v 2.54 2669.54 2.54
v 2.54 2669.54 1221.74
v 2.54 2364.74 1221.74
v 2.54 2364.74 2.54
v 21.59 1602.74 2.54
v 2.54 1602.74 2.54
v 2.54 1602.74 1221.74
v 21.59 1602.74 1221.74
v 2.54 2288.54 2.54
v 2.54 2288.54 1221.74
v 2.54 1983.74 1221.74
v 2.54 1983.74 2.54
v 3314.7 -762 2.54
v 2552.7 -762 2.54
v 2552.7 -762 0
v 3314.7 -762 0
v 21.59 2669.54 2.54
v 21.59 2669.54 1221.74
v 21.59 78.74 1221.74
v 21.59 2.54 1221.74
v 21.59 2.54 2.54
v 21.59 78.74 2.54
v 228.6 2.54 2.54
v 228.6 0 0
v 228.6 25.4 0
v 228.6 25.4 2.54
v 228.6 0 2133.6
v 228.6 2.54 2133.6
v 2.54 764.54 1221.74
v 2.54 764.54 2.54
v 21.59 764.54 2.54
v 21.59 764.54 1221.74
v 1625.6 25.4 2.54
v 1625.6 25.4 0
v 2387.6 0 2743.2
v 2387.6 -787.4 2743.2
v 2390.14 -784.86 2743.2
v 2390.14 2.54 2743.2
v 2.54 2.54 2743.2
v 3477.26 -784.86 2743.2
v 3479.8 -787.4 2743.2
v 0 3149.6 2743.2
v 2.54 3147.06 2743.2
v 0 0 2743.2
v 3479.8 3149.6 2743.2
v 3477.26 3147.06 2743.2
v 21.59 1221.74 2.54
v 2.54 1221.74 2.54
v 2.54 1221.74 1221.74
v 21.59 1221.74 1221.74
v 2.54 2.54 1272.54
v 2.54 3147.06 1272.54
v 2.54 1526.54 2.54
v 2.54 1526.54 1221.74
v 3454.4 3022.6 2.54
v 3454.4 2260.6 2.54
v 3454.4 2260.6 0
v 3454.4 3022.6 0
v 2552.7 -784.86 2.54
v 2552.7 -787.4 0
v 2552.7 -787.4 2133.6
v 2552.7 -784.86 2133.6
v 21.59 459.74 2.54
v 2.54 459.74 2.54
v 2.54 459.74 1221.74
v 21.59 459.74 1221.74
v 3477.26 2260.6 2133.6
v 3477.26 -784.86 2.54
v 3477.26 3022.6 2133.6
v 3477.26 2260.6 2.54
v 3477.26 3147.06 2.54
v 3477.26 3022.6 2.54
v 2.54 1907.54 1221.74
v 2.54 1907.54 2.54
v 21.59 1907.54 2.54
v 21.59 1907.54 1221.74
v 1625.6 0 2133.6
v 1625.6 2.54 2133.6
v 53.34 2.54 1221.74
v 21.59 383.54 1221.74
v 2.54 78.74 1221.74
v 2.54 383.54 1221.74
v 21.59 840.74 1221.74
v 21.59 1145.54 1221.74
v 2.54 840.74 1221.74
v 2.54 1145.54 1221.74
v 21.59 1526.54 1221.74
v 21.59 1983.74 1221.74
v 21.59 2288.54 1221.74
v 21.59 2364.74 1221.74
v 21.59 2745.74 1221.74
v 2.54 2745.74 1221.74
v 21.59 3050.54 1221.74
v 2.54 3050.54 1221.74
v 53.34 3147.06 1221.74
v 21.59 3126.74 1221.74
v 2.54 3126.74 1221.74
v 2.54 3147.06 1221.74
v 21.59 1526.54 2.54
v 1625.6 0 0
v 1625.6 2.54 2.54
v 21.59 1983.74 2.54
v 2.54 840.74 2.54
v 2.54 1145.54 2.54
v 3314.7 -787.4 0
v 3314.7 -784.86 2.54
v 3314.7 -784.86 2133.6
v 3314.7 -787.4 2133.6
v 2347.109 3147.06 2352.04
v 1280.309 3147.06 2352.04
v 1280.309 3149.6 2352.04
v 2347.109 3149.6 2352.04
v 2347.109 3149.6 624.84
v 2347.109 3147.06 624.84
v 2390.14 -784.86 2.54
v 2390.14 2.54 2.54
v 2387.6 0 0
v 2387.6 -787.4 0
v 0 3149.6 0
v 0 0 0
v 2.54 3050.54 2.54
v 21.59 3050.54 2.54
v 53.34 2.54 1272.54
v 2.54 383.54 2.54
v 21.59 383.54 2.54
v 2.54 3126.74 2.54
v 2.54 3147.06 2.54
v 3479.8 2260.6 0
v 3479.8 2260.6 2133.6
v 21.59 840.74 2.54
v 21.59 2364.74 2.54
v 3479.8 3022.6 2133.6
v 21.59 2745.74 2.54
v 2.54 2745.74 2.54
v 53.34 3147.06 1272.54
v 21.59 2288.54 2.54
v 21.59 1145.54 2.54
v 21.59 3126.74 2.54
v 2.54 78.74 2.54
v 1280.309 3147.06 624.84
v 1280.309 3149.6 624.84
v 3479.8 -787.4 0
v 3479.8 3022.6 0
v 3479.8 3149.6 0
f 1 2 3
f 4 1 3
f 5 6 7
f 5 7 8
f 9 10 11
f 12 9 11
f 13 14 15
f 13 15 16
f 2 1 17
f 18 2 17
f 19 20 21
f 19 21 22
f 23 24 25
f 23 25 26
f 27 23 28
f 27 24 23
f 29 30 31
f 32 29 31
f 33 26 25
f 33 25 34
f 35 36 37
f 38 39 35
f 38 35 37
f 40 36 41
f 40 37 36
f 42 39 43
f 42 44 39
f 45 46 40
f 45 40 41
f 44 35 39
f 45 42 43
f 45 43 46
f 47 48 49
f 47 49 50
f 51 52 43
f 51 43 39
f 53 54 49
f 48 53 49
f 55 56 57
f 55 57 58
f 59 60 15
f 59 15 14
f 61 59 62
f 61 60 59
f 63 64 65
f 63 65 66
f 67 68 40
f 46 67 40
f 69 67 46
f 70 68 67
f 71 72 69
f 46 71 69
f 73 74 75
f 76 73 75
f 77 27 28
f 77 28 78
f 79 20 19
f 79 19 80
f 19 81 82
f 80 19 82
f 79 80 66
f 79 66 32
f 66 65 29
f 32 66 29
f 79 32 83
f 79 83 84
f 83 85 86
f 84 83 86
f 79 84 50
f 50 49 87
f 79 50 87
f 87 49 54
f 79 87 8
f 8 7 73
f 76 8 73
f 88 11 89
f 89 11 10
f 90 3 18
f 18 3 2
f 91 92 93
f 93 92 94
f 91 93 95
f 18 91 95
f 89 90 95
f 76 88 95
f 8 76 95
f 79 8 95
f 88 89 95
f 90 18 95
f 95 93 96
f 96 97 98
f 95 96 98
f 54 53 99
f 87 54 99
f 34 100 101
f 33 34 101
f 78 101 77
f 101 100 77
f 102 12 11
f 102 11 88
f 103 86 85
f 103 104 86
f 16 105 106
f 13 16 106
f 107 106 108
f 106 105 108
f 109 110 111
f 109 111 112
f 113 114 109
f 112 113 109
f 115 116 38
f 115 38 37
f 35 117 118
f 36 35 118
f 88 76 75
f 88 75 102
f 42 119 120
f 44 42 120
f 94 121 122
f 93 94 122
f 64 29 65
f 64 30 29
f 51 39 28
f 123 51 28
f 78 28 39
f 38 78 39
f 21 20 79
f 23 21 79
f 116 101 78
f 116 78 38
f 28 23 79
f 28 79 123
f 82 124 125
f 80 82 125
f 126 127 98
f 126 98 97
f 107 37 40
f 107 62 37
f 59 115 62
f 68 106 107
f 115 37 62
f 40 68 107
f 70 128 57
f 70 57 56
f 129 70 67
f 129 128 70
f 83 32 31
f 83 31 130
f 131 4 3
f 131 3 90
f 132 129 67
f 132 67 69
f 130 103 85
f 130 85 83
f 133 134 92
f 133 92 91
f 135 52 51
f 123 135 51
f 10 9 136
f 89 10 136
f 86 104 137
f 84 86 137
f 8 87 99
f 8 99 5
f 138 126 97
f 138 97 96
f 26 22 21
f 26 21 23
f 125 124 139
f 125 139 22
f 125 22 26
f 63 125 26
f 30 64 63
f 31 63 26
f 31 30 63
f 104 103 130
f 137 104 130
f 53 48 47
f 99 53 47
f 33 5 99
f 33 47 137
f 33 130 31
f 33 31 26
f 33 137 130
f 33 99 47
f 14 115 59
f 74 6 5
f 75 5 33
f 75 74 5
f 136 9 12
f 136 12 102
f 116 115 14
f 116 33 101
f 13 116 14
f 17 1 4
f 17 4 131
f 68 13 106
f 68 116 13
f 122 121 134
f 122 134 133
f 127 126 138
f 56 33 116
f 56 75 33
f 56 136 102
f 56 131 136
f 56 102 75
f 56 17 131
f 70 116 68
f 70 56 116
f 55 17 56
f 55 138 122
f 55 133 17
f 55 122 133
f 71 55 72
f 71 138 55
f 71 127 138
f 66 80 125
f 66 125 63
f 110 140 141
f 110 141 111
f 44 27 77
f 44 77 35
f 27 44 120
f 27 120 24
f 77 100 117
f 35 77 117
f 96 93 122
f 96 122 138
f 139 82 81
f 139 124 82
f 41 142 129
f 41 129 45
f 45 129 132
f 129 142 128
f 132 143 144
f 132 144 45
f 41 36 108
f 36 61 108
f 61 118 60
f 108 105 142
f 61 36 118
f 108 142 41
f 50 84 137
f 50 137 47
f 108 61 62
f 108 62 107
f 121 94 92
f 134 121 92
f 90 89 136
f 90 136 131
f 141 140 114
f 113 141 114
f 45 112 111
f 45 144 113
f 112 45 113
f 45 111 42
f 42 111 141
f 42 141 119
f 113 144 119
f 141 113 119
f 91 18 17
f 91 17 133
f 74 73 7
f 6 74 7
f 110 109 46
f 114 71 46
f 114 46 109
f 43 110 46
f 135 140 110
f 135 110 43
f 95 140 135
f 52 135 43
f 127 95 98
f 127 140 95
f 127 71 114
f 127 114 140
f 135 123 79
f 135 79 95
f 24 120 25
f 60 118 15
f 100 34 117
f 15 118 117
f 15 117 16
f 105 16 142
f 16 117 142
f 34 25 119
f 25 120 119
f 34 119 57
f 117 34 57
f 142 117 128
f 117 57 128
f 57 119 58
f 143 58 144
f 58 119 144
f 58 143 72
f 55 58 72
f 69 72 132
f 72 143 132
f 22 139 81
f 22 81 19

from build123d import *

# Parameters (mm, degrees)
F1_DEPTH  = 2743.2
F2_T      = -2.54
F3_W      = 762
F3_H      = 2133.6
F4_DEPTH  = 25.4
F5_W      = 1397
F5_H      = 2133.6
F6_DEPTH  = 25.4
F7_W      = 762
F7_H      = 2133.6
F8_DEPTH  = 25.4
F9_W      = 1066.8
F9_H      = 1727.2
F10_DEPTH = 25.4
F11_W     = 19.05
F11_H     = 76.2
F12_DEPTH = 1219.2
F14_DEPTH = 50.8


with BuildPart() as f1:
    # F0 (on Top) → F1 (new body)
    with BuildSketch(Plane.XY):
        Polygon((0, 3149.6), (0, 0), (2387.6, 0), (2387.6, -787.4), (3479.8, -787.4), (3479.8, 3149.6), align=None)
    extrude(amount=F1_DEPTH)

    # F2
    f2_openings = [f1.faces().sort_by_distance(p)[0] for p in [
        (1826.758545, 1431.575804, 2743.2),
    ]]
    offset(amount=F2_T, openings=f2_openings, kind=Kind.INTERSECTION)

    # F3 (on face) → F4 (cut)
    with BuildSketch(Plane.XZ.offset(787.4)):
        with Locations((2933.7, 1066.8)):
            Rectangle(F3_W, F3_H)
    extrude(amount=-F4_DEPTH, mode=Mode.SUBTRACT)

    # F5 (on face) → F6 (cut)
    with BuildSketch(Plane.XZ):
        with Locations((927.1, 1066.8)):
            Rectangle(F5_W, F5_H)
    extrude(amount=-F6_DEPTH, mode=Mode.SUBTRACT)

    # F7 (on face) → F8 (cut)
    with BuildSketch(Plane.YZ.offset(3479.8)):
        with Locations((2641.6, 1066.8)):
            Rectangle(F7_W, F7_H)
    extrude(amount=-F8_DEPTH, mode=Mode.SUBTRACT)

    # F9 (on face) → F10 (cut)
    with BuildSketch(Plane.XZ.offset(-3147.06)):
        with Locations((1813.7093782425, 1488.44)):
            Rectangle(F9_W, F9_H)
    extrude(amount=-F10_DEPTH, mode=Mode.SUBTRACT)

    # F11 (on face) → F12 (join)
    with BuildSketch(Plane.XY.offset(2.54)):
        with Locations((12.065, 40.64)):
            Rectangle(F11_W, F11_H)
        with Locations((12.065, 421.64)):
            Rectangle(F11_W, F11_H)
        with Locations((12.065, 802.64)):
            Rectangle(F11_W, F11_H)
        with Locations((12.065, 1183.64)):
            Rectangle(F11_W, F11_H)
        with Locations((12.065, 1564.64)):
            Rectangle(F11_W, F11_H)
        with Locations((12.065, 1945.64)):
            Rectangle(F11_W, F11_H)
        with Locations((12.065, 2326.64)):
            Rectangle(F11_W, F11_H)
        with Locations((12.065, 2707.64)):
            Rectangle(F11_W, F11_H)
        with Locations((12.065, 3088.64)):
            Rectangle(F11_W, F11_H)
    extrude(amount=F12_DEPTH)

    # F13 (on face) → F14 (join)
    with BuildSketch(Plane.YZ.offset(2.54)):
        Polygon((2.54, 1272.54), (2.54, 1221.74), (78.74, 1221.74), (383.54, 1221.74), (459.74, 1221.74), (764.54, 1221.74), (840.74, 1221.74), (1145.54, 1221.74), (1221.74, 1221.74), (1526.54, 1221.74), (1602.74, 1221.74), (1907.54, 1221.74), (1983.74, 1221.74), (2288.54, 1221.74), (2364.74, 1221.74), (2669.54, 1221.74), (2745.74, 1221.74), (3050.54, 1221.74), (3126.74, 1221.74), (3147.06, 1221.74), (3147.06, 1272.54), align=None)
    extrude(amount=F14_DEPTH)


solid = f1.part
